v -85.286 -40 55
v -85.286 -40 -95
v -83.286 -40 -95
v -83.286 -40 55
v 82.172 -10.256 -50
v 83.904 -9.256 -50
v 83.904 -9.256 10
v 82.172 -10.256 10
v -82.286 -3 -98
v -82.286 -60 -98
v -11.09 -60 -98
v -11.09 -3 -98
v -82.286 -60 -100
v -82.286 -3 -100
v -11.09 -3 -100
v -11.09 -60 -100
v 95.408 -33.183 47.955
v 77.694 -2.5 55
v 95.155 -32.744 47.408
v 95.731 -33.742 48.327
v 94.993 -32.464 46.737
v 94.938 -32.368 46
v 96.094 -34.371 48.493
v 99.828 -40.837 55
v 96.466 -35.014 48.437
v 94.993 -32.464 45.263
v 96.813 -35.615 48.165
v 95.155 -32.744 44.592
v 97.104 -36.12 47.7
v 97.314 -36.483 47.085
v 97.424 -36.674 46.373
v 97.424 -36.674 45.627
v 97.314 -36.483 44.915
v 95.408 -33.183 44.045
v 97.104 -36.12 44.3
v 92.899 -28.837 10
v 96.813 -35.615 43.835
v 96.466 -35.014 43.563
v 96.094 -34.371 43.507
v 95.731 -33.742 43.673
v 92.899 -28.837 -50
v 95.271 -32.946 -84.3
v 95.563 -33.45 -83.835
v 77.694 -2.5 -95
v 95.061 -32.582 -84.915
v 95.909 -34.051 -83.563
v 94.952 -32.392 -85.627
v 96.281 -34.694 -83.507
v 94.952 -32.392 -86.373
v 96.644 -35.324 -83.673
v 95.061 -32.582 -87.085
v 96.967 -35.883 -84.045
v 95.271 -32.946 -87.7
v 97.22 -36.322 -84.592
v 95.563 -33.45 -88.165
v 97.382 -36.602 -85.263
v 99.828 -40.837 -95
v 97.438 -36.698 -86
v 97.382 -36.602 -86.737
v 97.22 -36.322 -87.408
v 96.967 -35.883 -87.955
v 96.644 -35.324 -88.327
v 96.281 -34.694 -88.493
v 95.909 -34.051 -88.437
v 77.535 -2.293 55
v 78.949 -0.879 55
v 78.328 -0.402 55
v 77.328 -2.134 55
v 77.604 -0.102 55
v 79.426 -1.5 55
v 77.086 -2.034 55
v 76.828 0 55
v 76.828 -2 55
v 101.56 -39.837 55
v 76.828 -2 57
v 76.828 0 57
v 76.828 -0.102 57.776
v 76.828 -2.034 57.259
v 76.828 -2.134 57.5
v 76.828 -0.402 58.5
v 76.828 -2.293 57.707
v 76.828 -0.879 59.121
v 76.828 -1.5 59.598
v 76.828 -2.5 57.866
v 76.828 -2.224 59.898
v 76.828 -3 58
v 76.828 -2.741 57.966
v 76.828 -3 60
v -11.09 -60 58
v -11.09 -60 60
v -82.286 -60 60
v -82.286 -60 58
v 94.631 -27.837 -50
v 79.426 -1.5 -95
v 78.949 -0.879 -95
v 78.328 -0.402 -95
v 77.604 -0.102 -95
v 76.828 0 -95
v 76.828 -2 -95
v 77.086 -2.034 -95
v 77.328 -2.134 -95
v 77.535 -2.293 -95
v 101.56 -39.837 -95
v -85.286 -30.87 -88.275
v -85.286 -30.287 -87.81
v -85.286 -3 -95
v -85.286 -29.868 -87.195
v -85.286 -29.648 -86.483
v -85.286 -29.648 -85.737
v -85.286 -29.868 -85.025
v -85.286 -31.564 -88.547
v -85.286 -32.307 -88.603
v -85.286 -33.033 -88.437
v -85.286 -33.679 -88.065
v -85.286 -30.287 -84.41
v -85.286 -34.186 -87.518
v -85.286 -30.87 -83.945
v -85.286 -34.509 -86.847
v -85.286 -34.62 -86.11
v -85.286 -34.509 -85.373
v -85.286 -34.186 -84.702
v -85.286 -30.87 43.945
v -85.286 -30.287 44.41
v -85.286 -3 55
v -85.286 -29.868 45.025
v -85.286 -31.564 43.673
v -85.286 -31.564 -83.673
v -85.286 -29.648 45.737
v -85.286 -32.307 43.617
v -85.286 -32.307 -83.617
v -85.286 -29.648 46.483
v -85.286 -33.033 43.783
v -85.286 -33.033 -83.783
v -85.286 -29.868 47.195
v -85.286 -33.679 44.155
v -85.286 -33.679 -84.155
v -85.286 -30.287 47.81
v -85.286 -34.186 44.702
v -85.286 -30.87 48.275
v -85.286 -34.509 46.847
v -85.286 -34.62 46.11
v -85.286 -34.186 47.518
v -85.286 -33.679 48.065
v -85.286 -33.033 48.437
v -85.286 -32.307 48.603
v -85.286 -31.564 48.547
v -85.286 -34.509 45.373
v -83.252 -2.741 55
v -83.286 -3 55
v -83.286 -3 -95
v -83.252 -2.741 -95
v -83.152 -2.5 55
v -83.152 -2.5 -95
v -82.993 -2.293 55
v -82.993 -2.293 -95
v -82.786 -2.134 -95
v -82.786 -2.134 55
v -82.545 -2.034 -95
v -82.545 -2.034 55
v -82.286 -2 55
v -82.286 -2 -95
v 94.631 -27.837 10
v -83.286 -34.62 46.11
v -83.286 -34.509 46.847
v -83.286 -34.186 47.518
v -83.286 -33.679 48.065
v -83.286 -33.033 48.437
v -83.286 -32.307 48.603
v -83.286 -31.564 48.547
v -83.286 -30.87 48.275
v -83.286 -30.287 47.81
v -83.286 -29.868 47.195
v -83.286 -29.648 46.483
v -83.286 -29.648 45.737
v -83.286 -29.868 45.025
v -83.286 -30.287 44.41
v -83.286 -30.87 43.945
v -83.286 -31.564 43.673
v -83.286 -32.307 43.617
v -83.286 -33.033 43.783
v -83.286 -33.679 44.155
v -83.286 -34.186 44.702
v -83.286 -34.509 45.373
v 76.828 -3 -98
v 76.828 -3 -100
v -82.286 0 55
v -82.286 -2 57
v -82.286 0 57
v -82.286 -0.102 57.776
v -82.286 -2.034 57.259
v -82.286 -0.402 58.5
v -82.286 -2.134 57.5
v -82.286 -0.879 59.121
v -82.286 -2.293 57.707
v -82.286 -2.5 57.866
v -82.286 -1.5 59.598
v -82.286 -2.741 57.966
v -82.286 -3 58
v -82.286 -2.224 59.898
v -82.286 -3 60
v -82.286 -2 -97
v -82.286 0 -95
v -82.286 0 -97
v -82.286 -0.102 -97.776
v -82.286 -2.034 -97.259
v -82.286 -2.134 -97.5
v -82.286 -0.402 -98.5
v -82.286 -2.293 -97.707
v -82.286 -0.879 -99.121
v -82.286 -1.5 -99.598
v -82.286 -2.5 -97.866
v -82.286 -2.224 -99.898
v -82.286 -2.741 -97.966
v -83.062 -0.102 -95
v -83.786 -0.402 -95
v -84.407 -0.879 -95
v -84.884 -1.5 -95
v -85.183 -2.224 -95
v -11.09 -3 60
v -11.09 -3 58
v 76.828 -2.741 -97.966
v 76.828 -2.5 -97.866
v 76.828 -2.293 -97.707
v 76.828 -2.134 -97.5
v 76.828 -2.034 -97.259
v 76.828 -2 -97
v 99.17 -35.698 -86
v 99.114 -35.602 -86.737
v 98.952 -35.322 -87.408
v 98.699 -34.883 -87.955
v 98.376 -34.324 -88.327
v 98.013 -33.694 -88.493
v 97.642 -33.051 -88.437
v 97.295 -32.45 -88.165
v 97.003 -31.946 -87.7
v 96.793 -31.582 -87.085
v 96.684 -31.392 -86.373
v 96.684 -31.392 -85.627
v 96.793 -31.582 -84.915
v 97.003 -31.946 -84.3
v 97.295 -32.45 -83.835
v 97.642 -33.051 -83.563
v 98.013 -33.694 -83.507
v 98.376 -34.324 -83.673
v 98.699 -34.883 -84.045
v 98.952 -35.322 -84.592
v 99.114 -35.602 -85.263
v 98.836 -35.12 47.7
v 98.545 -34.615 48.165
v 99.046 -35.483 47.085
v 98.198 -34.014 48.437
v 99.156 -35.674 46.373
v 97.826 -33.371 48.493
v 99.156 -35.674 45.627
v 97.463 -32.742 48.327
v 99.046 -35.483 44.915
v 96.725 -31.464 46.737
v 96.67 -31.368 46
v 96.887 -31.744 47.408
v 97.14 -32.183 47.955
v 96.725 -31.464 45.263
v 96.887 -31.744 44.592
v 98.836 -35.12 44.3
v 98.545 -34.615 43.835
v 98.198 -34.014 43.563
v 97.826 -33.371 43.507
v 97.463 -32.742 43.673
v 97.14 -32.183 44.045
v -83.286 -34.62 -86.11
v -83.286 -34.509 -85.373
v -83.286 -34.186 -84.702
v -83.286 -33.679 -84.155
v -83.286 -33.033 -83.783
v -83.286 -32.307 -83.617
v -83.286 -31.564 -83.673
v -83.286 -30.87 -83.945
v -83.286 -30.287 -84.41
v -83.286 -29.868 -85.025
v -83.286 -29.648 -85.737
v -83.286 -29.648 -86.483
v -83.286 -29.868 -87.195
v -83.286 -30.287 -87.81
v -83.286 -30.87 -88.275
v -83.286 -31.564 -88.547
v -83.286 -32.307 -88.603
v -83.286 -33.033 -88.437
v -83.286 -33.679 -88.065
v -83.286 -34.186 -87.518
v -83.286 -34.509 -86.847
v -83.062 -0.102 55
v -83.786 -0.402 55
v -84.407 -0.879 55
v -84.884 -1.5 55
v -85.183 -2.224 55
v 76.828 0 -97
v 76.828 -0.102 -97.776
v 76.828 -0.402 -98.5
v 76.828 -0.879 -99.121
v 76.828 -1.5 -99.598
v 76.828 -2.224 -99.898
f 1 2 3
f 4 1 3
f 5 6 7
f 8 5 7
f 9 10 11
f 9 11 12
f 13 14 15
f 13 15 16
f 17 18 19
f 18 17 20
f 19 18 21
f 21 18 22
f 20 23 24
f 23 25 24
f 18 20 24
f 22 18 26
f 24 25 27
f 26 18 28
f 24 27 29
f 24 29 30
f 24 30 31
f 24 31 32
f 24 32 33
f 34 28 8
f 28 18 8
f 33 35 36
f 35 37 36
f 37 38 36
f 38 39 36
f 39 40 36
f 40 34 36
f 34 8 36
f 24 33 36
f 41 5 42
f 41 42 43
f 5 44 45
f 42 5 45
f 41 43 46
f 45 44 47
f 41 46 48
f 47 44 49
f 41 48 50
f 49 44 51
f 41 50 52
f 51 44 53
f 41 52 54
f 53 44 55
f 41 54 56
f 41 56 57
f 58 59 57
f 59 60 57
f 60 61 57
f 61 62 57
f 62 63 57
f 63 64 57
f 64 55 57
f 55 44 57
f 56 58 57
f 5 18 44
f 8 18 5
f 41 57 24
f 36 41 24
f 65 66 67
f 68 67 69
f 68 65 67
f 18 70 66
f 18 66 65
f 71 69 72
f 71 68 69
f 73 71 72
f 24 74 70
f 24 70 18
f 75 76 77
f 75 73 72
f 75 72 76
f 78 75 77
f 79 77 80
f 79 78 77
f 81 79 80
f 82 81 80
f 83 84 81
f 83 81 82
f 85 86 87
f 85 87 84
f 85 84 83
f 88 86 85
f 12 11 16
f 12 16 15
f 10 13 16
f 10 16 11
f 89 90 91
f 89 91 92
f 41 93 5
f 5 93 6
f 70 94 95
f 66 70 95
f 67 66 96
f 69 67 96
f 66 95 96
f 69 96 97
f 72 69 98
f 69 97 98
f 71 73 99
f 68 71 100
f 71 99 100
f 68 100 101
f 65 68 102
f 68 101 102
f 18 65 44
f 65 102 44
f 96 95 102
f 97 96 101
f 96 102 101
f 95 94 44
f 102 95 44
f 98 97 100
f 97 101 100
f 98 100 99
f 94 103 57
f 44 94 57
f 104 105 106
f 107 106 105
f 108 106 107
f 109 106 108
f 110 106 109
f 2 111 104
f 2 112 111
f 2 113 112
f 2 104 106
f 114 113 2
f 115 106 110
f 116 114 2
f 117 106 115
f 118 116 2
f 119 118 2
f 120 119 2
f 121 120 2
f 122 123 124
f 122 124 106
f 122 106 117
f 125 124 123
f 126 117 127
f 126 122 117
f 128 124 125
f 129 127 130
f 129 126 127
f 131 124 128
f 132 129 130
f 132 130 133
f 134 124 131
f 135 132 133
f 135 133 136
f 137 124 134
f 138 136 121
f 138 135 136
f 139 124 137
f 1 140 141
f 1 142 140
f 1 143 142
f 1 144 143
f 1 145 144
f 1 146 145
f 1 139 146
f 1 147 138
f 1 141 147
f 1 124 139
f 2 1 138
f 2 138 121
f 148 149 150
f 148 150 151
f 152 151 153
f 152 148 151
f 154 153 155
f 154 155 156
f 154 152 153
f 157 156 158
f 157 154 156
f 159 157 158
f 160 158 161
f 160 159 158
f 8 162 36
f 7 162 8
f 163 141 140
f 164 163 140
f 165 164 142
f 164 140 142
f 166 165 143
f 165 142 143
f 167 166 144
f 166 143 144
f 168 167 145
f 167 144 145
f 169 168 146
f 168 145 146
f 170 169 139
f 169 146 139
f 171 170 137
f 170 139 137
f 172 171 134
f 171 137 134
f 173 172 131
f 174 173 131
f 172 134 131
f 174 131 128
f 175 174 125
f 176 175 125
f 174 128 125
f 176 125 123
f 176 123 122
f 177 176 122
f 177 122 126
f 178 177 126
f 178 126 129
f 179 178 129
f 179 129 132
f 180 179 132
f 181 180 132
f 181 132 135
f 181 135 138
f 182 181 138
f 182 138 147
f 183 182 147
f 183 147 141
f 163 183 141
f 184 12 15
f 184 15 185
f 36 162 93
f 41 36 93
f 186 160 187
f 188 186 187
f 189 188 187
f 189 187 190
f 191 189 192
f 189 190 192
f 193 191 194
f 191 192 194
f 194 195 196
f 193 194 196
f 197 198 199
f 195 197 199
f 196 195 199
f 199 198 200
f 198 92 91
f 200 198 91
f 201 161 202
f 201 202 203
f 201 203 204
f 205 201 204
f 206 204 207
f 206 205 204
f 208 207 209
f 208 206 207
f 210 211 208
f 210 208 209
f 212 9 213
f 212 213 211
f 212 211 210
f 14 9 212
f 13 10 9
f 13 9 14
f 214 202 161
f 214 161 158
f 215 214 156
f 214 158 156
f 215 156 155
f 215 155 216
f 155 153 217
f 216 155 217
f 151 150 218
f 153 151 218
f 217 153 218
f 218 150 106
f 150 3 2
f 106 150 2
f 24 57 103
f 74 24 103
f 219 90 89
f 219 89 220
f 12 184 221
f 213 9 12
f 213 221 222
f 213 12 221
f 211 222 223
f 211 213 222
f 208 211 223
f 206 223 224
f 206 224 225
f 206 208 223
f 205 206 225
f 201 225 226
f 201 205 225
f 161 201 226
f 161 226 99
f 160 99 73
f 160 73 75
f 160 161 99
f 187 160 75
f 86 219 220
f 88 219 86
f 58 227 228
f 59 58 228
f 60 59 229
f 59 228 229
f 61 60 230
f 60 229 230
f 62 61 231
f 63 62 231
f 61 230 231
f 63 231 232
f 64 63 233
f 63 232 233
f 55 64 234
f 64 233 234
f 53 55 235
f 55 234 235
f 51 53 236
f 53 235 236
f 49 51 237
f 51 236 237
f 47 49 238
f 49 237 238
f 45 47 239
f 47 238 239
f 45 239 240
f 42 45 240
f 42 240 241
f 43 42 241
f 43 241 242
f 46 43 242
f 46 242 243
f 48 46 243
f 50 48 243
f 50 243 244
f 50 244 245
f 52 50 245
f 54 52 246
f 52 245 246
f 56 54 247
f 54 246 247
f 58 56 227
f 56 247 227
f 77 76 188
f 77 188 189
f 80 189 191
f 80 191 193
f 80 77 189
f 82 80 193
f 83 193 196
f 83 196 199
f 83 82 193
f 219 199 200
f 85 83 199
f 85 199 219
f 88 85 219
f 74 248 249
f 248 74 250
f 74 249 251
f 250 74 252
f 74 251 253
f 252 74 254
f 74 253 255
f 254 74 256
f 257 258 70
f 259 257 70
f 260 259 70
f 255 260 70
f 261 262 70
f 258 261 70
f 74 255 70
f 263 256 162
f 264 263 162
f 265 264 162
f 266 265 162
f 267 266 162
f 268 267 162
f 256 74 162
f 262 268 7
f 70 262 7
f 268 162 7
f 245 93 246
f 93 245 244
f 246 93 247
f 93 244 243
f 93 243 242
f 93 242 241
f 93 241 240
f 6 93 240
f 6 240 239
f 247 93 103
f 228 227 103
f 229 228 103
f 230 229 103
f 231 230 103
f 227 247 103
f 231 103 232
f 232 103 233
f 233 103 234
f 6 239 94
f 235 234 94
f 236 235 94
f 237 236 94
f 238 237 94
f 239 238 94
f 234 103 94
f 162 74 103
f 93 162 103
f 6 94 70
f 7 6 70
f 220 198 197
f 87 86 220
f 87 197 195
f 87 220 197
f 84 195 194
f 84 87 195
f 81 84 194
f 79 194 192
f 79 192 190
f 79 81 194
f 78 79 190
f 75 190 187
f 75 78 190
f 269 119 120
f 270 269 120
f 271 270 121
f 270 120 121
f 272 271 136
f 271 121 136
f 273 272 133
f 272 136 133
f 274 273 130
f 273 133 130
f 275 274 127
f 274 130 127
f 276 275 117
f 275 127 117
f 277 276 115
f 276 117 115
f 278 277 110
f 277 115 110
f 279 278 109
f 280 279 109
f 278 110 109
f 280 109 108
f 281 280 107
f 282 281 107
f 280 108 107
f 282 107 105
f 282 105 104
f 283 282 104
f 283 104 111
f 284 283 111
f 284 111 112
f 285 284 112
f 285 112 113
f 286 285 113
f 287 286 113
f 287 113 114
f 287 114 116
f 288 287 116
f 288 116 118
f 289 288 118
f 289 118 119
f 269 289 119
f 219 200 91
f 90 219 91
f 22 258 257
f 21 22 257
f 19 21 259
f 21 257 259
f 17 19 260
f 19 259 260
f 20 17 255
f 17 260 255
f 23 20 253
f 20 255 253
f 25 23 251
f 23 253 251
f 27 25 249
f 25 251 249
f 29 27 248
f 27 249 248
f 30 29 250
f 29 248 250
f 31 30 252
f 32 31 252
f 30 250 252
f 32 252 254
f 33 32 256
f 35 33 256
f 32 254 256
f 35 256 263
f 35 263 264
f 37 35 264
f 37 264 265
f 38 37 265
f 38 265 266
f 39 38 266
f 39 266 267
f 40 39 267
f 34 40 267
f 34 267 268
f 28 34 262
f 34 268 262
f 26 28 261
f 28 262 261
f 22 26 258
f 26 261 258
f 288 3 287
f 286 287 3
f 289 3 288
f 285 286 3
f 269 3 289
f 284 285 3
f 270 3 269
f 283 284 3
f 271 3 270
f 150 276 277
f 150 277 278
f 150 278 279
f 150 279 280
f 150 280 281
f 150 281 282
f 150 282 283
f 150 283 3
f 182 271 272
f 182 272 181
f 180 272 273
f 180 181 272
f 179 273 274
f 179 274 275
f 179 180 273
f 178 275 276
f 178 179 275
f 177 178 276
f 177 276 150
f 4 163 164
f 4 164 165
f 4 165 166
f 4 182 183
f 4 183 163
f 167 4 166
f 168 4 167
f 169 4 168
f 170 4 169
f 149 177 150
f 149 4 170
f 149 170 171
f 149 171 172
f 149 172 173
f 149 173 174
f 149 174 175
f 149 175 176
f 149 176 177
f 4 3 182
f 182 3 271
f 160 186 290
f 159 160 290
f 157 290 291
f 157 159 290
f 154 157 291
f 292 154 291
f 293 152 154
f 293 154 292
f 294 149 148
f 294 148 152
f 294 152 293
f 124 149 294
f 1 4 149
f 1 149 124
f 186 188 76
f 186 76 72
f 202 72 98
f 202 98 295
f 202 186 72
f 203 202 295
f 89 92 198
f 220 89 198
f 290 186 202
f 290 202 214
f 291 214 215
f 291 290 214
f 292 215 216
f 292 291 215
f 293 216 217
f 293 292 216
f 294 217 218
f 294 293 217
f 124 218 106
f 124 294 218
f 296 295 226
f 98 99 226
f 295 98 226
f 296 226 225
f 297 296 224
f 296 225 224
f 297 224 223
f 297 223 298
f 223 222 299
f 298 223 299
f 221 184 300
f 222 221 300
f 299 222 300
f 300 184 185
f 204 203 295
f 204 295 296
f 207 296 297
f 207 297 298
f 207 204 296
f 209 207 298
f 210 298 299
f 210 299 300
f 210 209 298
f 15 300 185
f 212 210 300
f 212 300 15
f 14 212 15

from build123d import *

# Parameters (mm, degrees)
SKETCH1_W                    = 160
SKETCH1_H                    = 150
BASE_FLANGE1_DEPTH           = 2
EDGE_FLANGE1_START           = -95
EDGE_FLANGE1_DEPTH           = 150
EDGE_FLANGE2_STRIP_W         = 20
EDGE_FLANGE2_STRIP_H         = 2
EDGE_FLANGE2_STRIP_CUT_DEPTH = 150
EDGE_FLANGE2_DEPTH           = 150
EDGE_FLANGE4_DEPTH           = 159.113248654
EDGE_FLANGE5_DEPTH           = 159.113248654
SKETCH32_W                   = 30
SKETCH32_H                   = 21.454922416
CUT_EXTRUDE2_DEPTH           = 10
SKETCH33_W                   = 87.917980444
SKETCH33_H                   = 57
CUT_EXTRUDE3_DEPTH           = 199.782165551
SKETCH38_R                   = 2.5
CUT_EXTRUDE5_DEPTH           = 2
SKETCH39_R                   = 2.5
CUT_EXTRUDE6_DEPTH           = 3


# Read off the part's stored shape, not the designer's step: Edge-Flange1
# Sheet-metal steps are written as plain solids
with BuildPart() as part:
    # Sketch1 → Base-Flange1 (new body)
    with BuildSketch(Plane(origin=(0, 0, 0), x_dir=(1, 0, 0), z_dir=(0, 1, 0))):
        with Locations((-5.285714286, 20)):
            Rectangle(SKETCH1_W, SKETCH1_H)
    extrude(amount=-BASE_FLANGE1_DEPTH)

    # Edge-Flange1 outline → Edge-Flange1 (add)
    with BuildSketch(Plane.XY.offset(EDGE_FLANGE1_START)):
        with BuildLine():
            Line((101.559585176, -39.837168574), (79.42561058, -1.5))
            ThreePointArc((79.42561058, -1.5), (78.327534368, -0.401923789), (76.827534368, 0))
            Line((76.827534368, 0), (74.714285714, 0))
            Line((74.714285714, 0), (74.714285714, -2))
            Line((74.714285714, -2), (76.827534368, -2))
            ThreePointArc((76.827534368, -2), (77.327534368, -2.133974596), (77.693559772, -2.5))
            Line((77.693559772, -2.5), (99.827534368, -40.837168574))
            Line((99.827534368, -40.837168574), (101.559585176, -39.837168574))
        make_face()
    extrude(amount=EDGE_FLANGE1_DEPTH)

    # Edge-Flange2 strip (across the edge) → Edge-Flange2 strip cut (cut)
    with BuildSketch(Plane(origin=(-85.285714286, -2, 55), x_dir=(1, 0, 0), z_dir=(0, 0, -1))):
        with Locations((-7, -1)):
            Rectangle(EDGE_FLANGE2_STRIP_W, EDGE_FLANGE2_STRIP_H)
    extrude(amount=EDGE_FLANGE2_STRIP_CUT_DEPTH, mode=Mode.SUBTRACT)

    # Edge-Flange2 section (across the edge) → Edge-Flange2 (add)
    with BuildSketch(Plane(origin=(-85.285714286, -2, 55), x_dir=(1, 0, 0), z_dir=(0, 0, -1))):
        with BuildLine():
            Line((0, 1), (0, 38))
            Line((0, 38), (2, 38))
            Line((2, 38), (2, 1))
            ThreePointArc((2, 1), (2.292893219, 0.292893219), (3, 0))
            Line((3, 0), (3, -2))
            ThreePointArc((3, -2), (0.878679656, -1.121320344), (0, 1))
        make_face()
    extrude(amount=EDGE_FLANGE2_DEPTH)

    # Edge-Flange4 section (across the edge) → Edge-Flange4 (add)
    with BuildSketch(Plane(origin=(76.827534368, -2, 60), x_dir=(0, 0, -1), z_dir=(-1, 0, 0))):
        with BuildLine():
            Line((0, 1), (0, 58))
            Line((0, 58), (2, 58))
            Line((2, 58), (2, 1))
            ThreePointArc((2, 1), (2.292893219, 0.292893219), (3, 0))
            Line((3, 0), (5, 0))
            Line((5, 0), (5, -2))
            Line((5, -2), (3, -2))
            ThreePointArc((3, -2), (0.878679656, -1.121320344), (0, 1))
        make_face()
    extrude(amount=EDGE_FLANGE4_DEPTH)

    # Edge-Flange5 section (across the edge) → Edge-Flange5 (add)
    with BuildSketch(Plane(origin=(-82.285714286, -2, -100), x_dir=(0, 0, 1), z_dir=(1, 0, 0))):
        with BuildLine():
            Line((0, 1), (0, 58))
            Line((0, 58), (2, 58))
            Line((2, 58), (2, 1))
            ThreePointArc((2, 1), (2.292893219, 0.292893219), (3, 0))
            Line((3, 0), (5, 0))
            Line((5, 0), (5, -2))
            Line((5, -2), (3, -2))
            ThreePointArc((3, -2), (0.878679656, -1.121320344), (0, 1))
        make_face()
    extrude(amount=EDGE_FLANGE5_DEPTH)

    # Sketch32 → Cut-Extrude2 (cut)
    with BuildSketch(Plane(origin=(58.919688882, 34.017298237, 0), x_dir=(0, 0, -1), z_dir=(0.8660254037844364, 0.5000000000000039, 0))):
        with Locations((5, -60.695720616)):
            Rectangle(SKETCH32_W, SKETCH32_H)
        with Locations((35, -60.695720616)):
            Rectangle(SKETCH32_W, SKETCH32_H)
    extrude(amount=-CUT_EXTRUDE2_DEPTH, mode=Mode.SUBTRACT)

    # Sketch33 → Cut-Extrude3 (cut, through all)
    with BuildSketch(Plane.XY.offset(60)):
        with Locations((32.868544146, -31.5)):
            Rectangle(SKETCH33_W, SKETCH33_H)
    extrude(amount=-CUT_EXTRUDE3_DEPTH, mode=Mode.SUBTRACT)

    # Sketch38 → Cut-Extrude5 (cut)
    with BuildSketch(Plane(origin=(58.919688882, 34.017298237, 0), x_dir=(0, 0, -1), z_dir=(0.8660254037844363, 0.5000000000000042, 0))):
        with Locations(Location((-46, -78, 0), (0, 0, 90))):
            Circle(SKETCH38_R)
        with Locations(Location((86, -78, 0), (0, 0, 270))):
            Circle(SKETCH38_R)
    extrude(amount=-CUT_EXTRUDE5_DEPTH, mode=Mode.SUBTRACT)

    # Sketch39 → Cut-Extrude6 (cut)
    with BuildSketch(Plane.ZY.offset(85.285714286)):
        with Locations(Location((46.11, -32.12, 0), (0, 0, 270))):
            Circle(SKETCH39_R)
        with Locations(Location((-86.11, -32.12, 0), (0, 0, 270))):
            Circle(SKETCH39_R)
    extrude(amount=-CUT_EXTRUDE6_DEPTH, mode=Mode.SUBTRACT)


solid = part.part
